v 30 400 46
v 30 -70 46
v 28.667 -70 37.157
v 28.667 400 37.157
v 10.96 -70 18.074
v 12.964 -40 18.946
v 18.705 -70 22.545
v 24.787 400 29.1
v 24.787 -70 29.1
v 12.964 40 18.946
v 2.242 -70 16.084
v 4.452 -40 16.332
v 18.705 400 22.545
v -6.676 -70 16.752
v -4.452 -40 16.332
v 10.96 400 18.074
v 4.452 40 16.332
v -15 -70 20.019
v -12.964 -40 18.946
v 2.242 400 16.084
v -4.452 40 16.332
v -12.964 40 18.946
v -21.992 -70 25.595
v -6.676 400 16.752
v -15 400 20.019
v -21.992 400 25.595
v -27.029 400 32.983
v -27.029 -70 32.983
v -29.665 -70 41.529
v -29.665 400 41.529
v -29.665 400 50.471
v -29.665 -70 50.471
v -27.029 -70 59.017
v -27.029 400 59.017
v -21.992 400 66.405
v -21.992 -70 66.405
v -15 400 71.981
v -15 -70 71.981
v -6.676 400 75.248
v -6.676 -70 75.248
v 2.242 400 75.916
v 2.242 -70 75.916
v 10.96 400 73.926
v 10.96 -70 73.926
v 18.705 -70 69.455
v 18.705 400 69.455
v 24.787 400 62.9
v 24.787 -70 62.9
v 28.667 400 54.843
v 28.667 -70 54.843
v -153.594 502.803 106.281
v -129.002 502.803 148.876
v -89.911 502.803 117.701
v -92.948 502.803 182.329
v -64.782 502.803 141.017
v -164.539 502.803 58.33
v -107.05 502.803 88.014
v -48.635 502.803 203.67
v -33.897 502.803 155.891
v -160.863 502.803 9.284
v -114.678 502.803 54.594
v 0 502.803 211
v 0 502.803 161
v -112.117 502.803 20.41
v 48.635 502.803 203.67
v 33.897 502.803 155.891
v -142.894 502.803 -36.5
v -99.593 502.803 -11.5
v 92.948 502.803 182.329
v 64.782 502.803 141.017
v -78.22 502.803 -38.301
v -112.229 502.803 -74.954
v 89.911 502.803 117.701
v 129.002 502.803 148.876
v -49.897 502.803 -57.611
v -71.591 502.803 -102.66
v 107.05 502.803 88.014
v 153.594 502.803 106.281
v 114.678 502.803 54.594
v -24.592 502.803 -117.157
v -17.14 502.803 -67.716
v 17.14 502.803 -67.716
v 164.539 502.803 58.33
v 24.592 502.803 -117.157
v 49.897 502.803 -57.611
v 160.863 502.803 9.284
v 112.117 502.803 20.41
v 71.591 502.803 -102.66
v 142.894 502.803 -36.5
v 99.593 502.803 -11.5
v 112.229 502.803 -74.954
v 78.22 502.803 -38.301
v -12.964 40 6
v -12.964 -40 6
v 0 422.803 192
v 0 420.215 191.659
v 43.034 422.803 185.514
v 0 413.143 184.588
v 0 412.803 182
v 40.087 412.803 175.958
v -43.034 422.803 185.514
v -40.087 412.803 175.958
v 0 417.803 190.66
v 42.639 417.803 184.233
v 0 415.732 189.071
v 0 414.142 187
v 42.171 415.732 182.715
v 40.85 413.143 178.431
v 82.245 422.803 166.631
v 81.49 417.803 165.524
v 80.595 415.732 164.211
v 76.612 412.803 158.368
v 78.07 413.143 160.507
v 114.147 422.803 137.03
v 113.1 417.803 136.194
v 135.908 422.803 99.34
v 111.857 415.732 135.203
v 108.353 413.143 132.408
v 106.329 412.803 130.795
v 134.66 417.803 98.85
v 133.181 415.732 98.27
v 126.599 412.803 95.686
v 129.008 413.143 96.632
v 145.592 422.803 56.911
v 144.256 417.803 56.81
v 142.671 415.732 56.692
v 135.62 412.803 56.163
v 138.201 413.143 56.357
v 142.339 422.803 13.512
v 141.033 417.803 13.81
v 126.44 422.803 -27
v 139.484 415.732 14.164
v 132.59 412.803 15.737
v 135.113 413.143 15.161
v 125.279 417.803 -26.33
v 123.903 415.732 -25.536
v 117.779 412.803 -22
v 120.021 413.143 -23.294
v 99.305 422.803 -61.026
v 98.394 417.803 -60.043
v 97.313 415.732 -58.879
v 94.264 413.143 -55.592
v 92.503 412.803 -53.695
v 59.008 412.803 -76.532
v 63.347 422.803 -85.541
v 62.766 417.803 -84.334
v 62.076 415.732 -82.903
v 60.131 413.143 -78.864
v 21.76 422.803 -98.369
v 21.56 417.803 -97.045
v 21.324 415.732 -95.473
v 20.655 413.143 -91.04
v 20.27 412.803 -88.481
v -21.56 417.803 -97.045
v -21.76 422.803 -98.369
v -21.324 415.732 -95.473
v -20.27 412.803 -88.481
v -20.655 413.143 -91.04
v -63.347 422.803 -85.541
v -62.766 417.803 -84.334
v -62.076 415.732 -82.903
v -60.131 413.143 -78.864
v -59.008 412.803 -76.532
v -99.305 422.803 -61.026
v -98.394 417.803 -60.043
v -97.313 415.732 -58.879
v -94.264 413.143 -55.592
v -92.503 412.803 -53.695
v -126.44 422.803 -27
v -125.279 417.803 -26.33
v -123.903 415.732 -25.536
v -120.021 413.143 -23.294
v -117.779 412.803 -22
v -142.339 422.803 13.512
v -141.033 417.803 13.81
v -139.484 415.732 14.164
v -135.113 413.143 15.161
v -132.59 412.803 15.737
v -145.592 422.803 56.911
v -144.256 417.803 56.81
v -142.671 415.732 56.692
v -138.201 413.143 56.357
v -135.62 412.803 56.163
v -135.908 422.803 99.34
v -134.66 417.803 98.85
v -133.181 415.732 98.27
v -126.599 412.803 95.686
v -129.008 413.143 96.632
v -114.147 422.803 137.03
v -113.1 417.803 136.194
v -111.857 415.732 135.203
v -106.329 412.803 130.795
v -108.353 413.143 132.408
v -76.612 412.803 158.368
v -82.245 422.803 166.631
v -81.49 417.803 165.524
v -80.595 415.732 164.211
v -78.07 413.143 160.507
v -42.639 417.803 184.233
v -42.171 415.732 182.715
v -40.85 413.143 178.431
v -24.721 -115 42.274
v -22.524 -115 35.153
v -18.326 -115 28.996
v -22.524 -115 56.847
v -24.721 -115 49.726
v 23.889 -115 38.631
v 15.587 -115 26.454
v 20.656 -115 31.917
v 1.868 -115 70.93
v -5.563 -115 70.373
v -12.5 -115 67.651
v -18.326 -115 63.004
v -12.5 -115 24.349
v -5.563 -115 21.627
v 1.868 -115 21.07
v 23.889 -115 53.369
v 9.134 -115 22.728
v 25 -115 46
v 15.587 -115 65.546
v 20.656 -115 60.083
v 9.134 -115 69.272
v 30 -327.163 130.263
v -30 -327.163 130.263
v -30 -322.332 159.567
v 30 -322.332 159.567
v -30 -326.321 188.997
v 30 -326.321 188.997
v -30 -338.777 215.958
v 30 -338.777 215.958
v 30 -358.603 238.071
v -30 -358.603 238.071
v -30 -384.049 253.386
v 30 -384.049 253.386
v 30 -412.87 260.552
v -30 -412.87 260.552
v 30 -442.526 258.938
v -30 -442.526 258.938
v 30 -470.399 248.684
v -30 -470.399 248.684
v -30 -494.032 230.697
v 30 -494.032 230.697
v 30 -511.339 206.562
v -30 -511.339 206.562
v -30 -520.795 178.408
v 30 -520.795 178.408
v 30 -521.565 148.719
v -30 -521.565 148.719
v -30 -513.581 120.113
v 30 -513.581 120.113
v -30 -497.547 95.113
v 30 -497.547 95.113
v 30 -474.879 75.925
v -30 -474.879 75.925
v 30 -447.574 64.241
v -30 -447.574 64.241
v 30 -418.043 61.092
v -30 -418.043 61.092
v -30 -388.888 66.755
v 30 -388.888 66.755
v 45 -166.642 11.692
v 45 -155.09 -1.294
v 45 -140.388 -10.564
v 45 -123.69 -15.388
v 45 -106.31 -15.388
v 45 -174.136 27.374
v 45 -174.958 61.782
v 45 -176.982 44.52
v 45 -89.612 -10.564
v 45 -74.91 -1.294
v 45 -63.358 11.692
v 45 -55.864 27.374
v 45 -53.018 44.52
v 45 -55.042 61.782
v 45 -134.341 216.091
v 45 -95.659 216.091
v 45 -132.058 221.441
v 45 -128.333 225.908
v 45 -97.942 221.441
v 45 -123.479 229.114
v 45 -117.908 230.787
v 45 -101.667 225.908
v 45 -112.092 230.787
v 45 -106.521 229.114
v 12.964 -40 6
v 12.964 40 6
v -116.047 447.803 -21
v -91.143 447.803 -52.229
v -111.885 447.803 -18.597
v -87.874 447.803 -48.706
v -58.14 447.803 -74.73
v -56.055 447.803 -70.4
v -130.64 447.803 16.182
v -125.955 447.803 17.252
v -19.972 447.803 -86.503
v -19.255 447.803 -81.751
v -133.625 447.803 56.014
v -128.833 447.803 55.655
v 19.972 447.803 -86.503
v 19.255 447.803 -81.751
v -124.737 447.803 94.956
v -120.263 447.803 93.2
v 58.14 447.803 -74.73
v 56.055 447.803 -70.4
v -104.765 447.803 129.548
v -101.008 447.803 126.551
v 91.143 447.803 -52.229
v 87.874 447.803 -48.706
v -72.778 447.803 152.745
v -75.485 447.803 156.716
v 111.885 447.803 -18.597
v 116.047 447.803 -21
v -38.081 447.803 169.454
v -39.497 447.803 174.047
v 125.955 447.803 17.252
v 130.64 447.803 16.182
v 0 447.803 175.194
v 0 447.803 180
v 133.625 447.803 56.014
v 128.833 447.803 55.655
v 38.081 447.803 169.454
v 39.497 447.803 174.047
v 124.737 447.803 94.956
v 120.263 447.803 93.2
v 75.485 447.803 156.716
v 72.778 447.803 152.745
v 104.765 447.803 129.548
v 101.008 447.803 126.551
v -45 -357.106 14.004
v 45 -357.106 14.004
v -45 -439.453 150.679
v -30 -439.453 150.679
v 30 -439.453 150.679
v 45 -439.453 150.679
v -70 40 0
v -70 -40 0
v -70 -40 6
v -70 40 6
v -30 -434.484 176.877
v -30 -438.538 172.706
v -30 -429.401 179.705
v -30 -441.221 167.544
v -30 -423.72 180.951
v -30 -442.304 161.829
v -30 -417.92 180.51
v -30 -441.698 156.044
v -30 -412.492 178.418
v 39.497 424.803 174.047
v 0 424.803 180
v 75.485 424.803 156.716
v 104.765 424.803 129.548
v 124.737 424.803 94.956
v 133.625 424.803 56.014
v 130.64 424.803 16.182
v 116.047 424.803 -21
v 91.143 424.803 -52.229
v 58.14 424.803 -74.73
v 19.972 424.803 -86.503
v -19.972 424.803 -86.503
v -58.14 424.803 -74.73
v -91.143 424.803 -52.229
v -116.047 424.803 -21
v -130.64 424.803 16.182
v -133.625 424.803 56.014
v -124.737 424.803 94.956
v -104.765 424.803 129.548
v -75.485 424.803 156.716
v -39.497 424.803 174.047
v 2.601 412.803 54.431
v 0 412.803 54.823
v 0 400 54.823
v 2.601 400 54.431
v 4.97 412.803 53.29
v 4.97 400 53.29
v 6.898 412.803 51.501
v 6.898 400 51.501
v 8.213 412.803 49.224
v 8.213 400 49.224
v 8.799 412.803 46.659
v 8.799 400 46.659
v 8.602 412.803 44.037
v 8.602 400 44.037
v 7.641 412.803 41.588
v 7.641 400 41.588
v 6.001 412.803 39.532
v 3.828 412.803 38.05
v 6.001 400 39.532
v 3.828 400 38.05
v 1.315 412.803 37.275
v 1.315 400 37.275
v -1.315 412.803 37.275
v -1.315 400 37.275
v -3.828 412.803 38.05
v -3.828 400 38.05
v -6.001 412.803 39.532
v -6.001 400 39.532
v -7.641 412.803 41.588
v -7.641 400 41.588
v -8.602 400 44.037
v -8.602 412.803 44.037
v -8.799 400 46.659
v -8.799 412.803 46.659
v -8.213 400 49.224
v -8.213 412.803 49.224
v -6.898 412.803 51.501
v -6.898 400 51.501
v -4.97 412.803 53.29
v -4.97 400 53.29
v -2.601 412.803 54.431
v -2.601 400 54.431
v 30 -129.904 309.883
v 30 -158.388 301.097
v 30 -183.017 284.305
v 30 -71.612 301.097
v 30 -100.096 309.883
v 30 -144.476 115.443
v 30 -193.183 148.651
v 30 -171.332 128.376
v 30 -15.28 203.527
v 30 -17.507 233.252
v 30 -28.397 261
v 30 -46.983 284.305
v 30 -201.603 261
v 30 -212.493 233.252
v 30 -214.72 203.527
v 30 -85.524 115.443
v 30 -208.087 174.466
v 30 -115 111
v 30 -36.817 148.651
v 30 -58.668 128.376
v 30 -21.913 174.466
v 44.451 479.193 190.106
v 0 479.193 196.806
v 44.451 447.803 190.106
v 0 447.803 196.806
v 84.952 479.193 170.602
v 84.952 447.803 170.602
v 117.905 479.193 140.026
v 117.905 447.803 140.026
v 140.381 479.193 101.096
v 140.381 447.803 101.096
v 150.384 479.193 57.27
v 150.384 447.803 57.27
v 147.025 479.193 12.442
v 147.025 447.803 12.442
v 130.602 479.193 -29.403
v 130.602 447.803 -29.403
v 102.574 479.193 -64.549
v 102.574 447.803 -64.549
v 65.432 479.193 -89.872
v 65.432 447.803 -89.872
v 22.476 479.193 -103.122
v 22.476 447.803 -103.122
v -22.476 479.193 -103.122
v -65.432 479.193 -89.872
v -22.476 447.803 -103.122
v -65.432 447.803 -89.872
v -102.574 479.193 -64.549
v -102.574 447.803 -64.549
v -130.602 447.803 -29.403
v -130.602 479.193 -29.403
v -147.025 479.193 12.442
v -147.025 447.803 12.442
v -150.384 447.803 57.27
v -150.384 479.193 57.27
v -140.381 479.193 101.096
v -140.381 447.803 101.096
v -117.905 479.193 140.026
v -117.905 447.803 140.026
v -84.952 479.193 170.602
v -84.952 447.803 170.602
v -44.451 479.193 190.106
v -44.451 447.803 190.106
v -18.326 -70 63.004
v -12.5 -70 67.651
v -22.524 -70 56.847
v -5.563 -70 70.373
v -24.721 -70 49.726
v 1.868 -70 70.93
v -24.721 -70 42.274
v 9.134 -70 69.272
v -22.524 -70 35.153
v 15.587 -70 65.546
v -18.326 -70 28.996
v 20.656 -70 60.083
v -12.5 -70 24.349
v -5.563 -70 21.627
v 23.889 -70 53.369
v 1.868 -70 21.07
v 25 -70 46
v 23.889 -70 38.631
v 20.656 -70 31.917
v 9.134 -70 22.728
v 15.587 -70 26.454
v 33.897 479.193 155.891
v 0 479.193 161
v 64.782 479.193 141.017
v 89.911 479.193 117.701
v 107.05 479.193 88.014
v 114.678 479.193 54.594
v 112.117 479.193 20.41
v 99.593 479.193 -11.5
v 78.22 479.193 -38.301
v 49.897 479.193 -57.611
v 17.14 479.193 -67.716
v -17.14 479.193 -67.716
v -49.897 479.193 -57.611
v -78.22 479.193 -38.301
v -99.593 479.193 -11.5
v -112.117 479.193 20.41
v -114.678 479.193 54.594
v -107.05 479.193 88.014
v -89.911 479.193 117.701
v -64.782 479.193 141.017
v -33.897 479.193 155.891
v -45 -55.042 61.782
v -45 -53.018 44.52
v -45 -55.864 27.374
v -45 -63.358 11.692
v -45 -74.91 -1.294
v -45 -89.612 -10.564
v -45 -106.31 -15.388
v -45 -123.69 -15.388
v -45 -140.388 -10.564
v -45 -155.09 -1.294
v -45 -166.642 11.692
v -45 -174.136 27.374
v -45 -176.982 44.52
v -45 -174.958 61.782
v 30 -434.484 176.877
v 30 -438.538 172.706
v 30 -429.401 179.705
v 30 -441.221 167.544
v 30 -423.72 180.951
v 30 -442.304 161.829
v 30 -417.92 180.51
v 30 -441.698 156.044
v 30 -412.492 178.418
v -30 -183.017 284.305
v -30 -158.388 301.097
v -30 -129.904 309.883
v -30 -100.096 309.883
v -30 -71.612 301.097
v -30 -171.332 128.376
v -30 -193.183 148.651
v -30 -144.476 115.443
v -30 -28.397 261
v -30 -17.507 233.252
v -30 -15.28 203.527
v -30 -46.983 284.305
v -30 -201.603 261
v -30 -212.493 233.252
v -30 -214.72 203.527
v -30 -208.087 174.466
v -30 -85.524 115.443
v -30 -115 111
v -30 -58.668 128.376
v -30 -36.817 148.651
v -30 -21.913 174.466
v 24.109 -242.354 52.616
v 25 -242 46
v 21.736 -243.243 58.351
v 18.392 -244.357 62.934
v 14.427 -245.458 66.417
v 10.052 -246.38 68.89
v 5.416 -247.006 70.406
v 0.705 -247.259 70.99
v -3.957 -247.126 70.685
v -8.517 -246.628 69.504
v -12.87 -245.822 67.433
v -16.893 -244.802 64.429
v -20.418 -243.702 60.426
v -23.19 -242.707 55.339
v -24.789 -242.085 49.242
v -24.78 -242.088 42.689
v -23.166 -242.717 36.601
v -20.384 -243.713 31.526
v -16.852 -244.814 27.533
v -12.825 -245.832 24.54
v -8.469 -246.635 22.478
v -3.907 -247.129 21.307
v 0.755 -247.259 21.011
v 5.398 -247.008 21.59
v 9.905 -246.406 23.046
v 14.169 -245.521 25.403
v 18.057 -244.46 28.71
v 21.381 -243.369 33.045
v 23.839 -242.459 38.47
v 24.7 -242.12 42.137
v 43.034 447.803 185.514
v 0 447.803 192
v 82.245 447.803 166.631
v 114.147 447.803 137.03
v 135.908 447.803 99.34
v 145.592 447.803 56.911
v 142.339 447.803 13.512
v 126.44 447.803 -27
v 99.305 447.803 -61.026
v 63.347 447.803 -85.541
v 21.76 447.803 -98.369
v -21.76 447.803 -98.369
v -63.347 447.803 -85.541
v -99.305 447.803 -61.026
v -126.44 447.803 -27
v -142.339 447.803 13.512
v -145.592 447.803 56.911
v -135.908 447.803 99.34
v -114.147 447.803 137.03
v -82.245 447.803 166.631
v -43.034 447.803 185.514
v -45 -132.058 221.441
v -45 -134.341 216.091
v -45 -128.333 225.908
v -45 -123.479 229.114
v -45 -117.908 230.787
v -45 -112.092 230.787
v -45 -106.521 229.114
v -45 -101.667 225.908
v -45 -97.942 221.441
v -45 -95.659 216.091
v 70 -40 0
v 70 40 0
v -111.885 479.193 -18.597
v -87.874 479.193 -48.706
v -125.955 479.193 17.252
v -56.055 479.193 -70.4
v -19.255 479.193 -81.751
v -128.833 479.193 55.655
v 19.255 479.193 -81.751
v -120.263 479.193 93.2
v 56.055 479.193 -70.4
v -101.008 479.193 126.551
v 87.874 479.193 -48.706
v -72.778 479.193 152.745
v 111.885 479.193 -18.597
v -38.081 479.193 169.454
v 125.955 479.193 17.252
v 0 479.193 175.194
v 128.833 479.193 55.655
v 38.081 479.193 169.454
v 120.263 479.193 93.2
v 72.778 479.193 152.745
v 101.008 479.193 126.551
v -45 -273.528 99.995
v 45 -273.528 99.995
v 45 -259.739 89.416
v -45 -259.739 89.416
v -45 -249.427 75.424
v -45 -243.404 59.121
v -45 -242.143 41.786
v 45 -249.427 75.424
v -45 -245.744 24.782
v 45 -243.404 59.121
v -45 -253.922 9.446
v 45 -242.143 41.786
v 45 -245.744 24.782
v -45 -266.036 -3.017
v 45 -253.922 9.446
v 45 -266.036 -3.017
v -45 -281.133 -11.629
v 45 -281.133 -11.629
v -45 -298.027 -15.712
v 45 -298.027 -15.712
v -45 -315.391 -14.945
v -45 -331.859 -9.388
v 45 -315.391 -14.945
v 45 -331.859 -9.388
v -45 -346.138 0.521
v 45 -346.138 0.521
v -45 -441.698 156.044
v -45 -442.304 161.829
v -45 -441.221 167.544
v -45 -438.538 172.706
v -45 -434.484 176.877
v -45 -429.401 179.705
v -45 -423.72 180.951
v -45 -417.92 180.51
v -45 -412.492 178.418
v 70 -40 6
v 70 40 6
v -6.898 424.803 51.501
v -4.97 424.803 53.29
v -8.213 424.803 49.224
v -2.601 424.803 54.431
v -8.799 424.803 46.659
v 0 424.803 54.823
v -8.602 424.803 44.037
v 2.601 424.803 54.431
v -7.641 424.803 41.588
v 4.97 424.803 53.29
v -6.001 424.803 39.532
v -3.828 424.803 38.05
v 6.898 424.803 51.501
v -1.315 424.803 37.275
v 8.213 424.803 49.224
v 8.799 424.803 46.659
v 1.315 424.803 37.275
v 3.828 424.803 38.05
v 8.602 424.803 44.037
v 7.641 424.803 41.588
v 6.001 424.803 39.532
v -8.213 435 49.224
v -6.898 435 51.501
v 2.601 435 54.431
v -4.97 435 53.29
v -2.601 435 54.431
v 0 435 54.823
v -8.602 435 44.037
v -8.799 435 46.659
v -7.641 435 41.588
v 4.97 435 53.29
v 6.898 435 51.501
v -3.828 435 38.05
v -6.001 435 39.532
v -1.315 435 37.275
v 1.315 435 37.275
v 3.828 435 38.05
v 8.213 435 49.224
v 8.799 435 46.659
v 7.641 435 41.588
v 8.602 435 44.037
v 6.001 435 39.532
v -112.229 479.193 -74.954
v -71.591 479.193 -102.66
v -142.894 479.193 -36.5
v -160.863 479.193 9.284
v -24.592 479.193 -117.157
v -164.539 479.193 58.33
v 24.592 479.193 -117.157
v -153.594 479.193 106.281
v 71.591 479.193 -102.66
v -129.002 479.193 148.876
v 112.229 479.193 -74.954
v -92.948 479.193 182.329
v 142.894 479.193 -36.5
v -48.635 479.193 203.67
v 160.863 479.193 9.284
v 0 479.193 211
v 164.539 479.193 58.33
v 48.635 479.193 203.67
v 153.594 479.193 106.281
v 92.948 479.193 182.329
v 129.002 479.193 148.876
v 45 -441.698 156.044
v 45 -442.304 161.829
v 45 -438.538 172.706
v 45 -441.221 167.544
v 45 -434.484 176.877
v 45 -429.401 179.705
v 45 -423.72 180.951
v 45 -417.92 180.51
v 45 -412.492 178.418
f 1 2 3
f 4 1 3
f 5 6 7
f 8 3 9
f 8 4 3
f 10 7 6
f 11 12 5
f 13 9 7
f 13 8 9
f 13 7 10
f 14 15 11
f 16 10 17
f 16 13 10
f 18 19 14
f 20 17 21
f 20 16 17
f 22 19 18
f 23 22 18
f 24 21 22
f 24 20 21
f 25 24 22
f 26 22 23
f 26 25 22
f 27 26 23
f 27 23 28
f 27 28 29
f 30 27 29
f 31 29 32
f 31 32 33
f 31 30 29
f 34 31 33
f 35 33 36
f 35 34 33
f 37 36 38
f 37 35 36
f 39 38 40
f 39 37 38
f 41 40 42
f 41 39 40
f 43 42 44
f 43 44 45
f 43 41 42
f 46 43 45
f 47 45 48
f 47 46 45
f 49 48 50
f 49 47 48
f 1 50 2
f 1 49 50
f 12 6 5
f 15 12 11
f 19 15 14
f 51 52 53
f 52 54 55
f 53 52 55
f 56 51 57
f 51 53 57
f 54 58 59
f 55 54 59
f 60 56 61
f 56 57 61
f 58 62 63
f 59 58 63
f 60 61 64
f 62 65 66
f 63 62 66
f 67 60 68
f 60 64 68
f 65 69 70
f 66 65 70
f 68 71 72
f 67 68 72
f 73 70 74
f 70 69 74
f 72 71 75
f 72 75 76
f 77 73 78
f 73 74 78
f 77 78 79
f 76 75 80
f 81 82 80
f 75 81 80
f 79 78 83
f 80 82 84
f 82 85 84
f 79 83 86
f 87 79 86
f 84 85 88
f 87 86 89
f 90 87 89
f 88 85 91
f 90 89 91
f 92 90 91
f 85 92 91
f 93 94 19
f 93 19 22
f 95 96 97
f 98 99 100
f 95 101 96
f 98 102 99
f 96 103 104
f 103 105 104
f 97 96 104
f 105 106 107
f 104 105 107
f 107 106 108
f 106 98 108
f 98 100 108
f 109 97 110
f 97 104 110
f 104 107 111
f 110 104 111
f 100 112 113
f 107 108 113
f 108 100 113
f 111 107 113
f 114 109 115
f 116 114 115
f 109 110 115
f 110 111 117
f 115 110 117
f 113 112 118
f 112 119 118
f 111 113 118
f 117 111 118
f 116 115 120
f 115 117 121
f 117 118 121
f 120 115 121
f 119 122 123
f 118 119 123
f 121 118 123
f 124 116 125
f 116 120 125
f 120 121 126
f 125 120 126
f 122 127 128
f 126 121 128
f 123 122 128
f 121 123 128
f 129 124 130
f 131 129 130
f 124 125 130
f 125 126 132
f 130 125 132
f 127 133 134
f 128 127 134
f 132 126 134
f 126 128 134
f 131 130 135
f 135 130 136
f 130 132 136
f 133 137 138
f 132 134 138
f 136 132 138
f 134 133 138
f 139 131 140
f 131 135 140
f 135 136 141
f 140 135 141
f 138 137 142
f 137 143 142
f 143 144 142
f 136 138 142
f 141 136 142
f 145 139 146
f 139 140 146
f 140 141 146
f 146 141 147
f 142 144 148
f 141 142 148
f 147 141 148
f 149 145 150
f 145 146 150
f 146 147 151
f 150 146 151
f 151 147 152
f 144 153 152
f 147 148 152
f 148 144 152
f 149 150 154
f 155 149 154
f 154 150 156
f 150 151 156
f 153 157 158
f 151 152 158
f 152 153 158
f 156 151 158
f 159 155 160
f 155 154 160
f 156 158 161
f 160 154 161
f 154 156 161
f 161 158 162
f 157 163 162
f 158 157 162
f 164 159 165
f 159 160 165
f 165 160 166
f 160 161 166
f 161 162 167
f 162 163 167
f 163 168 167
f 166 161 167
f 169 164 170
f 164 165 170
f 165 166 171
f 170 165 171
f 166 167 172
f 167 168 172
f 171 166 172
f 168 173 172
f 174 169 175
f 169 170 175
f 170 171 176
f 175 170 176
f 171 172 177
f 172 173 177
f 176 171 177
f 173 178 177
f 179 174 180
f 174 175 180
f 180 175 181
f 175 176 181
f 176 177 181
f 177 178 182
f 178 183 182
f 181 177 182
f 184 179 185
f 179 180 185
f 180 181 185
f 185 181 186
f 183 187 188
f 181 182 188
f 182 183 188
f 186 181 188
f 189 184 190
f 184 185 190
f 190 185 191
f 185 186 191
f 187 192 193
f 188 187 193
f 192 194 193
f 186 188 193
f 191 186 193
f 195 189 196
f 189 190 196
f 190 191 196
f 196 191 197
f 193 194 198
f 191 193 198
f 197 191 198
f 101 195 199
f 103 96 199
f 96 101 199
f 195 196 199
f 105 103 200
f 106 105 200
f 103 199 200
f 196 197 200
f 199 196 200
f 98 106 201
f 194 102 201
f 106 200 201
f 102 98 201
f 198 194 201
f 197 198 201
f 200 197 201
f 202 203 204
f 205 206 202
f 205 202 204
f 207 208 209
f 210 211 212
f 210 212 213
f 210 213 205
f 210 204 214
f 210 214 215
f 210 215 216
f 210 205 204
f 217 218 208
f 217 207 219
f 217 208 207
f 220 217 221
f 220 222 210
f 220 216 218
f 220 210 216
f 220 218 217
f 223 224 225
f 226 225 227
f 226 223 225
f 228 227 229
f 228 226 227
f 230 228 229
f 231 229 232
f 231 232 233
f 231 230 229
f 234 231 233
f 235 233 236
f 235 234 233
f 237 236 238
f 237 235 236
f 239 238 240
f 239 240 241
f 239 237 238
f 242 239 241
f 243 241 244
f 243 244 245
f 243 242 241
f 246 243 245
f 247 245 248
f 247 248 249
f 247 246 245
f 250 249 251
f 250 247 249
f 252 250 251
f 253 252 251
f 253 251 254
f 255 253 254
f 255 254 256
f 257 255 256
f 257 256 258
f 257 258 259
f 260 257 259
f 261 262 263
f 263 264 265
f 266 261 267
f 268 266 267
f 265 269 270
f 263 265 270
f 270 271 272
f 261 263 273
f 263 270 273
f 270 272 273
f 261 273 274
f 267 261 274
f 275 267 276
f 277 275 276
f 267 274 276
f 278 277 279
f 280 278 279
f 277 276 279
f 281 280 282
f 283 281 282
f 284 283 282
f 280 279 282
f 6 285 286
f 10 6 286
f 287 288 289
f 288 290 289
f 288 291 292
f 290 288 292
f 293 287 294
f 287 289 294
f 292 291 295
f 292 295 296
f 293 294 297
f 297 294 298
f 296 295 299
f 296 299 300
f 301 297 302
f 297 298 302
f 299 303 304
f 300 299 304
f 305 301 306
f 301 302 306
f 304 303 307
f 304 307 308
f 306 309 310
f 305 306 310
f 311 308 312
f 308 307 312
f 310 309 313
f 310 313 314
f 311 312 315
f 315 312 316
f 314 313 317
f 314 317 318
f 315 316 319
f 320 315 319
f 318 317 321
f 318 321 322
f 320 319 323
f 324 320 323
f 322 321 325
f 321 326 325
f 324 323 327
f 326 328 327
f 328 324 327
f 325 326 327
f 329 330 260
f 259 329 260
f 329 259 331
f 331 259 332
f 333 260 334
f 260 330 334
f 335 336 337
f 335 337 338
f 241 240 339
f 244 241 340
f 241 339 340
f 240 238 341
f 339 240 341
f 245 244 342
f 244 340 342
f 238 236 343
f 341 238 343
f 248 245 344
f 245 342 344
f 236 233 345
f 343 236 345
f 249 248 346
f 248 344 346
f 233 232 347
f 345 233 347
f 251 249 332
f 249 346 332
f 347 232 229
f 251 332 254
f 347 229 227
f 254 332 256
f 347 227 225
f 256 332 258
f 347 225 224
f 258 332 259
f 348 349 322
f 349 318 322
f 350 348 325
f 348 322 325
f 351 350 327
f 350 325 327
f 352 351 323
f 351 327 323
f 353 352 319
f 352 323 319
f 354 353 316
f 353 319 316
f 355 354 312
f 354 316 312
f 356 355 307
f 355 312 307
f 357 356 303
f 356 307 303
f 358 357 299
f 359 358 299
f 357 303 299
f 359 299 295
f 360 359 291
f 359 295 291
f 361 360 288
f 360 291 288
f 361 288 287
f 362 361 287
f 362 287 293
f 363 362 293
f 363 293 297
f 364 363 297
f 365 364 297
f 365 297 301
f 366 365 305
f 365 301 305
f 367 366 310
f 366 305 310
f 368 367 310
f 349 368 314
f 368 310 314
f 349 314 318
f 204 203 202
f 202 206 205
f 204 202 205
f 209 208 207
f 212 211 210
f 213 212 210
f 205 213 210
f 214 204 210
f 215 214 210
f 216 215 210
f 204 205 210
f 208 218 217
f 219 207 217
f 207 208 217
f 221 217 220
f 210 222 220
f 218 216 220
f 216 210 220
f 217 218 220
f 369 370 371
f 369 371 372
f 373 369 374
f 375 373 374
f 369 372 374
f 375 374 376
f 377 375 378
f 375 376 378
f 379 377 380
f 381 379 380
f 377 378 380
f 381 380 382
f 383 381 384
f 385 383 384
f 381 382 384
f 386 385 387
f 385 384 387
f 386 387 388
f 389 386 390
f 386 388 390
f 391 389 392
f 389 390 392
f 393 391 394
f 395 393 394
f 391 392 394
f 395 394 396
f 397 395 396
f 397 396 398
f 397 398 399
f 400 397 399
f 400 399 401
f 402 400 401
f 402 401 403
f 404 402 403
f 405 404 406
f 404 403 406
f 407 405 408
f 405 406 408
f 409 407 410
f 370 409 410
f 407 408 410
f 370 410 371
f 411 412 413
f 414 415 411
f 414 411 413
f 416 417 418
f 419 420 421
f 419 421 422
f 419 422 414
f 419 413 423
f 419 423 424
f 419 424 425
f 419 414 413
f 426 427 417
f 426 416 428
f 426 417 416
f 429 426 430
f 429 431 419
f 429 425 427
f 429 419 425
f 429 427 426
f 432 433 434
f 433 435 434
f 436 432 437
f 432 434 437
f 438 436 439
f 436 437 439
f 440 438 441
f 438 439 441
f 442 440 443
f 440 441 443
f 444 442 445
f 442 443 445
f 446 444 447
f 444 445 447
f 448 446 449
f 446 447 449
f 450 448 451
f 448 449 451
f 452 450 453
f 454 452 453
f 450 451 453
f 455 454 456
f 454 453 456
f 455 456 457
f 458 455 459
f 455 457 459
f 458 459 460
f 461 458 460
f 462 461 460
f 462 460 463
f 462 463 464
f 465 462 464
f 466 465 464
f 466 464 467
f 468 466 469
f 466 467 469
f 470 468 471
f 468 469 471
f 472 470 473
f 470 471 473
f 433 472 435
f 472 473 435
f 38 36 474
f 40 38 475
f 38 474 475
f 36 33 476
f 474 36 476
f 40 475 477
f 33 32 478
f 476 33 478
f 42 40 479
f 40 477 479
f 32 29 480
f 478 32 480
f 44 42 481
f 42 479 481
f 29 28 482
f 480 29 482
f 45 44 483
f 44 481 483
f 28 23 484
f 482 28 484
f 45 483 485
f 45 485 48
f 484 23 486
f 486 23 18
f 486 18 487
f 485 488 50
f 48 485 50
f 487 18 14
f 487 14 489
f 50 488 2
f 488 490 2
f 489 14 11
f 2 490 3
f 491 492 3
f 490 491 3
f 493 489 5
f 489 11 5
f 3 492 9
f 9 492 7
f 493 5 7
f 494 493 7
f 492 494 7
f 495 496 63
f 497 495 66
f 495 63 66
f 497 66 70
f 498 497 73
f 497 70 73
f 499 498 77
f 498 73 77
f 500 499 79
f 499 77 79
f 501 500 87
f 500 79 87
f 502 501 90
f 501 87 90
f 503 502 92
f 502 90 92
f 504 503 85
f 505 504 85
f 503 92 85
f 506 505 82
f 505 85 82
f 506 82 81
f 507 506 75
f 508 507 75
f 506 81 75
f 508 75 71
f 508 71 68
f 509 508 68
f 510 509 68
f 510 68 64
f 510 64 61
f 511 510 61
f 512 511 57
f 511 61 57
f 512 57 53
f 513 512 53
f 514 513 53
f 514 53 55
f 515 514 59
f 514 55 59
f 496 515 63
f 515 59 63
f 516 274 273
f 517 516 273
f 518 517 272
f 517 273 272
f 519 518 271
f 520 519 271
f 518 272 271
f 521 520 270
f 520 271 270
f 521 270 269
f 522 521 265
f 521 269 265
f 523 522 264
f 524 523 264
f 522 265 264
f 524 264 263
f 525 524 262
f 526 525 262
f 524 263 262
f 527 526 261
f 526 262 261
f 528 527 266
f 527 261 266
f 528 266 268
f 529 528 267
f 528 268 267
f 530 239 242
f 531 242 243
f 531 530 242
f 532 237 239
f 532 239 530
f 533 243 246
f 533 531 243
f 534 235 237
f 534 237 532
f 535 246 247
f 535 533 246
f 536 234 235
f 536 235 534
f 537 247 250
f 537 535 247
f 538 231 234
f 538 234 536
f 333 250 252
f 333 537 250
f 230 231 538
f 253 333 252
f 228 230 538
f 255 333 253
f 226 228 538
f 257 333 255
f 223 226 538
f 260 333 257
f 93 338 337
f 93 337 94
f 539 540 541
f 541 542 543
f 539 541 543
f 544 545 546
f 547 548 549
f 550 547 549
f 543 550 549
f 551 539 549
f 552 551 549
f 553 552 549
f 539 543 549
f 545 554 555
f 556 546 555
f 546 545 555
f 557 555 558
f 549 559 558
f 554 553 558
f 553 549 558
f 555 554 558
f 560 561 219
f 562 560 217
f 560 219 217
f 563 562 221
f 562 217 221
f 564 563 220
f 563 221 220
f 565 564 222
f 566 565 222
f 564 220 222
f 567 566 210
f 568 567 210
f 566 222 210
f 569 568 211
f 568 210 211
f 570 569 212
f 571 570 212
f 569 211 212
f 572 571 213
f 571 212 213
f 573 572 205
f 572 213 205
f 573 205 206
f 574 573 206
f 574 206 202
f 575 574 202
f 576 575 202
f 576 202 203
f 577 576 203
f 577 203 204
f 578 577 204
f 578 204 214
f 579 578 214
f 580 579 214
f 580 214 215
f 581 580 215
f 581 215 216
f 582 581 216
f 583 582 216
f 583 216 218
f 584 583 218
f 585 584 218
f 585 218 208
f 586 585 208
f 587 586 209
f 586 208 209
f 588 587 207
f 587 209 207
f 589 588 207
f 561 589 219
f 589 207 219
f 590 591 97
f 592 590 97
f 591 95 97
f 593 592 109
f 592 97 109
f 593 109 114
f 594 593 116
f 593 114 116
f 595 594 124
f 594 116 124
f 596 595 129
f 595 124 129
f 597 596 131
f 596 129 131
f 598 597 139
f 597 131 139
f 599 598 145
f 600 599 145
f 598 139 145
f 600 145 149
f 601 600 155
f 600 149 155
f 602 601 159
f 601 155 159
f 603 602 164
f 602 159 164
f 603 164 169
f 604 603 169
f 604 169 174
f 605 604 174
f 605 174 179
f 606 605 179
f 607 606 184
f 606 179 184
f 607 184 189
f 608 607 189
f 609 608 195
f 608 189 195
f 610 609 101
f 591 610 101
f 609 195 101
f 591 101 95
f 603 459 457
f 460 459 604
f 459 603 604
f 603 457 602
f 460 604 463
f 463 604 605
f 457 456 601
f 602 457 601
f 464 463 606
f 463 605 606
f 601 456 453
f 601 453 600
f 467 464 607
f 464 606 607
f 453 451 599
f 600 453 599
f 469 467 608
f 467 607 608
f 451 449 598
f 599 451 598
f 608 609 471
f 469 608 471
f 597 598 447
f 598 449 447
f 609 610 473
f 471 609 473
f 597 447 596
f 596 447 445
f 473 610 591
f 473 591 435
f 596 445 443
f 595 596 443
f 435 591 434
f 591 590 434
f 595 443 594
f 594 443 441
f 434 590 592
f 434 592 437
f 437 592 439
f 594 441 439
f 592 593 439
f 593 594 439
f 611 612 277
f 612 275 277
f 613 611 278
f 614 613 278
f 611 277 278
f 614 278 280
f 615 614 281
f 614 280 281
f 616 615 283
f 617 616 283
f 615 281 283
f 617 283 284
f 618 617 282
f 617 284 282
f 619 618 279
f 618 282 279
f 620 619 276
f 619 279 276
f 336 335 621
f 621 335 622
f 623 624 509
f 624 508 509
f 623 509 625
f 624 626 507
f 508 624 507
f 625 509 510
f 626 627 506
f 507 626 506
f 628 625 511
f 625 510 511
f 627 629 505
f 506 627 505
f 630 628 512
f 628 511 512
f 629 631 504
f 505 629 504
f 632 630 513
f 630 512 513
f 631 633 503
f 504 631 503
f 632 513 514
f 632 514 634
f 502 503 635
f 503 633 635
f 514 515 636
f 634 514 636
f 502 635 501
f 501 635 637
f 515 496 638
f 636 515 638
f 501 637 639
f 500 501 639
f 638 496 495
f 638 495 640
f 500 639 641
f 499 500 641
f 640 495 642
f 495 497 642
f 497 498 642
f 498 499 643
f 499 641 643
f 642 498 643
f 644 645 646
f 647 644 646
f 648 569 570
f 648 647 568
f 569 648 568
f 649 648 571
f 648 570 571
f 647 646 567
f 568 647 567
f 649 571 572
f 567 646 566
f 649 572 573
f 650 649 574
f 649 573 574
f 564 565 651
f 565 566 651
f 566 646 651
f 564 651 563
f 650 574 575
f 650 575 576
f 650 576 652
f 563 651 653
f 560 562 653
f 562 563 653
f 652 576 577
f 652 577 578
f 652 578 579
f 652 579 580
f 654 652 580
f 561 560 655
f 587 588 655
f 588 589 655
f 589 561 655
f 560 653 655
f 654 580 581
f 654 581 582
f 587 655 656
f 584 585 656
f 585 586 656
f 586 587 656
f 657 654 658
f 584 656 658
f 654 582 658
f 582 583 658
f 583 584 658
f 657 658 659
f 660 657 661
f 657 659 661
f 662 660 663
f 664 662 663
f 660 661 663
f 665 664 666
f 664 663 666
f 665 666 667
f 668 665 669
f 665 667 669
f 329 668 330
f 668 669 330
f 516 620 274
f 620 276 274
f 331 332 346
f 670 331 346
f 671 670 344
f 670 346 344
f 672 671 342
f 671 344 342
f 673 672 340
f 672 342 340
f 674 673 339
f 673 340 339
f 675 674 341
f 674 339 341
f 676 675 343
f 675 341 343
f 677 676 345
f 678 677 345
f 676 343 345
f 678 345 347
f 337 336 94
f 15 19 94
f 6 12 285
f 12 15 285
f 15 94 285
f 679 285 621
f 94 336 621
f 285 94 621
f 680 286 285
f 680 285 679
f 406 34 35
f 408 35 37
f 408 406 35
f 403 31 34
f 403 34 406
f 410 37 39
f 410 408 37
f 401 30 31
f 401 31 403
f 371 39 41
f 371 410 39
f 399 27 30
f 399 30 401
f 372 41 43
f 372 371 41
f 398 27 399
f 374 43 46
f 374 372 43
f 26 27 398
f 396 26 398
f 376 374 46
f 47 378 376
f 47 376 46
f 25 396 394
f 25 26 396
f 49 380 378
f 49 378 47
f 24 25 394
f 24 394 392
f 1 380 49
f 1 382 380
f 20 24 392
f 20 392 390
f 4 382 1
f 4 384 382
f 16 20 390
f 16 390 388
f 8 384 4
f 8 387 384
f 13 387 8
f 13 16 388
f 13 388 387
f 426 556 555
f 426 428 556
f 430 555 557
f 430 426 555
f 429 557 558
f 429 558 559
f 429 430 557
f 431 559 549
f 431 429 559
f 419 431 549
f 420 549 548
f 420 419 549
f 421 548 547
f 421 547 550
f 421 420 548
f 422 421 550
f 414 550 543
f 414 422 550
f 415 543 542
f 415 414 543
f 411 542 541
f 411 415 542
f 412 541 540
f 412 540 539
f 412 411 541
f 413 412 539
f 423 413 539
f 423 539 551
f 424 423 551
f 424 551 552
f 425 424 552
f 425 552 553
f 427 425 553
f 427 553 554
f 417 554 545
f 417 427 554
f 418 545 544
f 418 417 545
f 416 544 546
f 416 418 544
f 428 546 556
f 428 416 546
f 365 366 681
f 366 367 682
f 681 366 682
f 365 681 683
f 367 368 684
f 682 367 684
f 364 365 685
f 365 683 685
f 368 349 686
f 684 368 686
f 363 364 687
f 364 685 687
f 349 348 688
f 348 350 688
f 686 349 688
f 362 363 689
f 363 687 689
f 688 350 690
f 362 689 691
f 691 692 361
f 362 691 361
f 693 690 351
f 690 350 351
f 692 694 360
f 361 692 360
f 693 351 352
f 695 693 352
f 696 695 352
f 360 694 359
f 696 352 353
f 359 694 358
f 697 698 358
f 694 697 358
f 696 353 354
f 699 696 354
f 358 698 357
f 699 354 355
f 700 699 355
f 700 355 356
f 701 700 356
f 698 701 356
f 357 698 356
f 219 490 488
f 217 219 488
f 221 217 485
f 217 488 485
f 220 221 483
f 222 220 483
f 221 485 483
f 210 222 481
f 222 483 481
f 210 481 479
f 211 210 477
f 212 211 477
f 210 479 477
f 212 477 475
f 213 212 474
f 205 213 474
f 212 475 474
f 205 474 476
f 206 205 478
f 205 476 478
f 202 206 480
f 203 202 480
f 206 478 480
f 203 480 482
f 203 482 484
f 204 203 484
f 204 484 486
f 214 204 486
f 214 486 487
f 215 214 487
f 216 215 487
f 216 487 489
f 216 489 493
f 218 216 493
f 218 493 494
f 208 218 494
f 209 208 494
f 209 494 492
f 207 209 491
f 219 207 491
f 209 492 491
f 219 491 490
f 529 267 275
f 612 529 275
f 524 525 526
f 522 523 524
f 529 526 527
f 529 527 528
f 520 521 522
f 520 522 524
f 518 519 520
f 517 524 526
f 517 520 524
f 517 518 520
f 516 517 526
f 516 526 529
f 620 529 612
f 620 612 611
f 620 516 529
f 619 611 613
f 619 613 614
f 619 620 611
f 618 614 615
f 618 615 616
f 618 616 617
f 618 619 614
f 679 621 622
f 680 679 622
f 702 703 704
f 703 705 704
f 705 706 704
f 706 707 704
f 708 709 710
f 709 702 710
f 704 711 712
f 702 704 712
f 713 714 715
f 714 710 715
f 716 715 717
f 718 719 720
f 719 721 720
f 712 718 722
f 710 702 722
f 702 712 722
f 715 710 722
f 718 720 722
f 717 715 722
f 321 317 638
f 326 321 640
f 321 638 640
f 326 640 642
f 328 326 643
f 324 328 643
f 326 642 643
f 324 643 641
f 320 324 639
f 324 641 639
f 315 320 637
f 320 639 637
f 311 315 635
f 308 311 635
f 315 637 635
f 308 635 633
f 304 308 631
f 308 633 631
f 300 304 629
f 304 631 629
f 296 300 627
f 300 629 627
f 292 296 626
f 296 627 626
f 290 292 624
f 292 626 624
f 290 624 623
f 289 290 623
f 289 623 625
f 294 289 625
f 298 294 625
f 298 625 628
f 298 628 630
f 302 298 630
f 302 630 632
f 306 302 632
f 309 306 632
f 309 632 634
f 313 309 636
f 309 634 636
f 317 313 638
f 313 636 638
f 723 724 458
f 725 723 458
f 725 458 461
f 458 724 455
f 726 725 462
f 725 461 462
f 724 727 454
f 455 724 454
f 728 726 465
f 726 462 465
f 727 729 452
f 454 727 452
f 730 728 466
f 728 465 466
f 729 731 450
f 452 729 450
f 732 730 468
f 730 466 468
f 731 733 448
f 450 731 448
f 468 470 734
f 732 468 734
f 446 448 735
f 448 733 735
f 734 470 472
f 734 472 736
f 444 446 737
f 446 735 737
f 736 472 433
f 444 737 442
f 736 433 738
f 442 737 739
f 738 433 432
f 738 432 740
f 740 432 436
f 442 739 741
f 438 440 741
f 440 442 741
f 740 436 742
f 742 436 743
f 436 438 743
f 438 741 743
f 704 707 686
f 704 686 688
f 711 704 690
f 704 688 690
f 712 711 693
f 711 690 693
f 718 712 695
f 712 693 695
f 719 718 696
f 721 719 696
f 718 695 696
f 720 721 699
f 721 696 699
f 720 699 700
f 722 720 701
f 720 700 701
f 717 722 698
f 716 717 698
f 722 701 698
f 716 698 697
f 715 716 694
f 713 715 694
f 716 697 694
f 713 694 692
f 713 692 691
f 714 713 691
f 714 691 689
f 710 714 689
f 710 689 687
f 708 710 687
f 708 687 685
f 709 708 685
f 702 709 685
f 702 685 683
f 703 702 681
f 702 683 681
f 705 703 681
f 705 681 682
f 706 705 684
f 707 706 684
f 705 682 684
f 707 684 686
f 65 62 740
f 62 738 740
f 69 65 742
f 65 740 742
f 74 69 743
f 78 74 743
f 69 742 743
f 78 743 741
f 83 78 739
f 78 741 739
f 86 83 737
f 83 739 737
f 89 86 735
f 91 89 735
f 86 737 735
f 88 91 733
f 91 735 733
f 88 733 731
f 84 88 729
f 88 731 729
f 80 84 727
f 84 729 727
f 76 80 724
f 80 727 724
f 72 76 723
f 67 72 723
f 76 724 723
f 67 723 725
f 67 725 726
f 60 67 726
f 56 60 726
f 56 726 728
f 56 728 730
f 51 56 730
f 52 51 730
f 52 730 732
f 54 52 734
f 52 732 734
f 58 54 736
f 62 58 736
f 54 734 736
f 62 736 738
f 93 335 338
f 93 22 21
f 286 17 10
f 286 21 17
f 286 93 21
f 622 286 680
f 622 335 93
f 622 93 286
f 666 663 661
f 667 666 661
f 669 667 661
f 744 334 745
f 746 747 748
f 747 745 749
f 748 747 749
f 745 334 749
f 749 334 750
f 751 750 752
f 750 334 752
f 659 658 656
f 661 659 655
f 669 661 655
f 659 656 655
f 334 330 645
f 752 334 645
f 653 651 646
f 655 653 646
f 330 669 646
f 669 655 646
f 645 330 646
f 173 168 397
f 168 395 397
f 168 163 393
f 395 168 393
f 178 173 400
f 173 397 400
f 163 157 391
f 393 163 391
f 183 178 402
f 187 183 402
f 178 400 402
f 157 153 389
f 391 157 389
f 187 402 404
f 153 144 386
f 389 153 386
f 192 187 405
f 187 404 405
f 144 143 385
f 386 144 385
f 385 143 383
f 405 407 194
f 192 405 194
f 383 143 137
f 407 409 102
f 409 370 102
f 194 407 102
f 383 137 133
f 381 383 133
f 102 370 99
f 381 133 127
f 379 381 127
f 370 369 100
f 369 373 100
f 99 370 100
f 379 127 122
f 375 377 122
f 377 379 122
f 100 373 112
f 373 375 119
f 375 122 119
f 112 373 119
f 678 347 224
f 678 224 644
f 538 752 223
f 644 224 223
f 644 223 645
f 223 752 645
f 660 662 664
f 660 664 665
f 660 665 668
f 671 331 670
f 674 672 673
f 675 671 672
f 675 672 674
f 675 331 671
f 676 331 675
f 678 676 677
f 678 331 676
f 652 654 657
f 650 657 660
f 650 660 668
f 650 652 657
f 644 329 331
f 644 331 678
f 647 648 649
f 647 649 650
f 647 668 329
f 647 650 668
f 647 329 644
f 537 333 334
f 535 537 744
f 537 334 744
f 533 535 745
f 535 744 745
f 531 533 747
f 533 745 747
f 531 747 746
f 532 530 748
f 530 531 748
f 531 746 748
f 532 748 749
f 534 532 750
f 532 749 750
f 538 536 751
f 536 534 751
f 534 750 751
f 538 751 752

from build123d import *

# Parameters (mm, degrees)
SKETCH1_W                = 140
SKETCH1_H                = 80
BOSS_EXTRUDE1_DEPTH      = 6
SKETCH2_R                = 30
BOSS_EXTRUDE2_DEPTH      = 400
BOSS_EXTRUDE2_DEPTH_BACK = 70
SKETCH3_R                = 25
BOSS_EXTRUDE3_DEPTH      = 45
BOSS_EXTRUDE4_DEPTH      = 45
BOSS_EXTRUDE4_DEPTH_BACK = 45
SKETCH6_R                = 100
BOSS_EXTRUDE5_DEPTH      = 30
BOSS_EXTRUDE5_DEPTH_BACK = 30
SKETCH7_W                = 25.927573348
SKETCH7_H                = 80
BOSS_EXTRUDE6_DEPTH      = 12.945606
SKETCH9_R                = 25
BOSS_EXTRUDE7_DEPTH      = 189
BOSS_EXTRUDE8_DEPTH      = 45
BOSS_EXTRUDE8_DEPTH_BACK = 45
SKETCH11_R               = 100
BOSS_EXTRUDE9_DEPTH      = 30
BOSS_EXTRUDE9_DEPTH_BACK = 30


with BuildPart() as part:
    # Sketch1 → Boss-Extrude1 (new body)
    with BuildSketch(Plane.XY):
        Rectangle(SKETCH1_W, SKETCH1_H)
    extrude(amount=BOSS_EXTRUDE1_DEPTH)



with BuildPart() as body_2:
    # Sketch2 → Boss-Extrude2 (new body, two sides)
    with BuildSketch(Plane(origin=(0, 0, 0), x_dir=(1, 0, 0), z_dir=(0, 1, 0))) as boss_extrude2_sk:
        with Locations((0, -46)):
            Circle(SKETCH2_R)
    extrude(amount=BOSS_EXTRUDE2_DEPTH)
    extrude(boss_extrude2_sk.sketch, amount=-BOSS_EXTRUDE2_DEPTH_BACK)

    # Sketch3 → Boss-Extrude3 (add)
    with BuildSketch(Plane.XZ.offset(70)):
        with Locations((0, 46)):
            Circle(SKETCH3_R)
    extrude(amount=BOSS_EXTRUDE3_DEPTH)


with BuildPart() as body_3:
    # Sketch4 → Boss-Extrude4 (new body, two sides)
    with BuildSketch(Plane(origin=(0, 0, 0), x_dir=(0, 0, -1), z_dir=(1, 0, 0))) as boss_extrude4_sk:
        with BuildLine():
            Line((-61.781818182, -174.957770263), (-216.090909091, -134.341216214))
            ThreePointArc((-216.090909091, -134.341216214), (-231, -115), (-216.090909091, -95.658783786))
            Line((-216.090909091, -95.658783786), (-61.781818182, -55.042229737))
            ThreePointArc((-61.781818182, -55.042229737), (16, -115), (-61.781818182, -174.957770263))
        make_face()
    extrude(amount=BOSS_EXTRUDE4_DEPTH)
    extrude(boss_extrude4_sk.sketch, amount=-BOSS_EXTRUDE4_DEPTH_BACK)


with BuildPart() as body_4:
    # Sketch6 → Boss-Extrude5 (new body, two sides)
    with BuildSketch(Plane(origin=(0, 0, 0), x_dir=(0, 0, -1), z_dir=(1, 0, 0))) as boss_extrude5_sk:
        with Locations((-211, -115)):
            Circle(SKETCH6_R)
    extrude(amount=BOSS_EXTRUDE5_DEPTH)
    extrude(boss_extrude5_sk.sketch, amount=-BOSS_EXTRUDE5_DEPTH_BACK)


with BuildPart() as part_1:
    add(part.part)

    add(body_2.part)  # Boss-Extrude6 merges body 2
    # Sketch7 → Boss-Extrude6 (add)
    with BuildSketch(Plane.XY.offset(6)):
        Rectangle(SKETCH7_W, SKETCH7_H)
    extrude(amount=BOSS_EXTRUDE6_DEPTH)

    # Sketch8 → Revolve1 (revolve)
    with BuildSketch(Plane(origin=(0, 0, 0), x_dir=(0, 0, -1), z_dir=(1, 0, 0))):
        with BuildLine():
            Line((-46, 400), (-46, 435))
            Line((-46, 435), (-54.823317896, 435))
            Line((-54.823317896, 435), (-54.823317896, 424.802746782))
            Line((-54.823317896, 424.802746782), (-180, 424.802746782))
            Line((-180, 424.802746782), (-180, 447.802746782))
            Line((-180, 447.802746782), (-175.193885925, 447.802746782))
            Line((-175.193885925, 447.802746782), (-175.193885925, 479.193114191))
            Line((-175.193885925, 479.193114191), (-161, 479.193114191))
            Line((-161, 479.193114191), (-161, 502.802746782))
            Line((-161, 502.802746782), (-211, 502.802746782))
            Line((-211, 502.802746782), (-211, 479.193114191))
            Line((-211, 479.193114191), (-196.806114075, 479.193114191))
            Line((-196.806114075, 479.193114191), (-196.806114075, 447.802746782))
            Line((-196.806114075, 447.802746782), (-192, 447.802746782))
            Line((-192, 447.802746782), (-192, 422.802746782))
            ThreePointArc((-192, 422.802746782), (-189.071067812, 415.731678971), (-182, 412.802746782))
            Line((-182, 412.802746782), (-54.823317896, 412.802746782))
            Line((-54.823317896, 412.802746782), (-54.823317896, 400))
            Line((-54.823317896, 400), (-46, 400))
        make_face()
    revolve(axis=Axis((0, 400, 46), (0, 1, 0)))


with BuildPart() as body_4_2:
    # Sketch9 → Boss-Extrude7 (new body)
    with BuildSketch(Plane.XZ.offset(115)):
        with Locations((0, 46)):
            Circle(SKETCH9_R)
    extrude(amount=BOSS_EXTRUDE7_DEPTH)

    # Sketch10 → Boss-Extrude8 (add, two sides)
    with BuildSketch(Plane(origin=(0, 0, 0), x_dir=(0, 0, -1), z_dir=(1, 0, 0))) as boss_extrude8_sk:
        with BuildLine():
            Line((-178.417806727, -412.492047919), (-99.995200853, -273.528401997))
            ThreePointArc((-99.995200853, -273.528401997), (-2.787878788, -259.539764054), (-14.003697219, -357.105899939))
            Line((-14.003697219, -357.105899939), (-150.678612006, -439.452531126))
            ThreePointArc((-150.678612006, -439.452531126), (-174.939393939, -436.663607257), (-178.417806727, -412.492047919))
        make_face()
    extrude(amount=BOSS_EXTRUDE8_DEPTH)
    extrude(boss_extrude8_sk.sketch, amount=-BOSS_EXTRUDE8_DEPTH_BACK)

    # Sketch11 → Boss-Extrude9 (add, two sides)
    with BuildSketch(Plane(origin=(0, 0, 0), x_dir=(0, 0, -1), z_dir=(1, 0, 0))) as boss_extrude9_sk:
        with Locations((-161, -422.321595662)):
            Circle(SKETCH11_R)
    extrude(amount=BOSS_EXTRUDE9_DEPTH)
    extrude(boss_extrude9_sk.sketch, amount=-BOSS_EXTRUDE9_DEPTH_BACK)


solid = Compound([body_3.part, body_4.part, part_1.part, body_4_2.part])
